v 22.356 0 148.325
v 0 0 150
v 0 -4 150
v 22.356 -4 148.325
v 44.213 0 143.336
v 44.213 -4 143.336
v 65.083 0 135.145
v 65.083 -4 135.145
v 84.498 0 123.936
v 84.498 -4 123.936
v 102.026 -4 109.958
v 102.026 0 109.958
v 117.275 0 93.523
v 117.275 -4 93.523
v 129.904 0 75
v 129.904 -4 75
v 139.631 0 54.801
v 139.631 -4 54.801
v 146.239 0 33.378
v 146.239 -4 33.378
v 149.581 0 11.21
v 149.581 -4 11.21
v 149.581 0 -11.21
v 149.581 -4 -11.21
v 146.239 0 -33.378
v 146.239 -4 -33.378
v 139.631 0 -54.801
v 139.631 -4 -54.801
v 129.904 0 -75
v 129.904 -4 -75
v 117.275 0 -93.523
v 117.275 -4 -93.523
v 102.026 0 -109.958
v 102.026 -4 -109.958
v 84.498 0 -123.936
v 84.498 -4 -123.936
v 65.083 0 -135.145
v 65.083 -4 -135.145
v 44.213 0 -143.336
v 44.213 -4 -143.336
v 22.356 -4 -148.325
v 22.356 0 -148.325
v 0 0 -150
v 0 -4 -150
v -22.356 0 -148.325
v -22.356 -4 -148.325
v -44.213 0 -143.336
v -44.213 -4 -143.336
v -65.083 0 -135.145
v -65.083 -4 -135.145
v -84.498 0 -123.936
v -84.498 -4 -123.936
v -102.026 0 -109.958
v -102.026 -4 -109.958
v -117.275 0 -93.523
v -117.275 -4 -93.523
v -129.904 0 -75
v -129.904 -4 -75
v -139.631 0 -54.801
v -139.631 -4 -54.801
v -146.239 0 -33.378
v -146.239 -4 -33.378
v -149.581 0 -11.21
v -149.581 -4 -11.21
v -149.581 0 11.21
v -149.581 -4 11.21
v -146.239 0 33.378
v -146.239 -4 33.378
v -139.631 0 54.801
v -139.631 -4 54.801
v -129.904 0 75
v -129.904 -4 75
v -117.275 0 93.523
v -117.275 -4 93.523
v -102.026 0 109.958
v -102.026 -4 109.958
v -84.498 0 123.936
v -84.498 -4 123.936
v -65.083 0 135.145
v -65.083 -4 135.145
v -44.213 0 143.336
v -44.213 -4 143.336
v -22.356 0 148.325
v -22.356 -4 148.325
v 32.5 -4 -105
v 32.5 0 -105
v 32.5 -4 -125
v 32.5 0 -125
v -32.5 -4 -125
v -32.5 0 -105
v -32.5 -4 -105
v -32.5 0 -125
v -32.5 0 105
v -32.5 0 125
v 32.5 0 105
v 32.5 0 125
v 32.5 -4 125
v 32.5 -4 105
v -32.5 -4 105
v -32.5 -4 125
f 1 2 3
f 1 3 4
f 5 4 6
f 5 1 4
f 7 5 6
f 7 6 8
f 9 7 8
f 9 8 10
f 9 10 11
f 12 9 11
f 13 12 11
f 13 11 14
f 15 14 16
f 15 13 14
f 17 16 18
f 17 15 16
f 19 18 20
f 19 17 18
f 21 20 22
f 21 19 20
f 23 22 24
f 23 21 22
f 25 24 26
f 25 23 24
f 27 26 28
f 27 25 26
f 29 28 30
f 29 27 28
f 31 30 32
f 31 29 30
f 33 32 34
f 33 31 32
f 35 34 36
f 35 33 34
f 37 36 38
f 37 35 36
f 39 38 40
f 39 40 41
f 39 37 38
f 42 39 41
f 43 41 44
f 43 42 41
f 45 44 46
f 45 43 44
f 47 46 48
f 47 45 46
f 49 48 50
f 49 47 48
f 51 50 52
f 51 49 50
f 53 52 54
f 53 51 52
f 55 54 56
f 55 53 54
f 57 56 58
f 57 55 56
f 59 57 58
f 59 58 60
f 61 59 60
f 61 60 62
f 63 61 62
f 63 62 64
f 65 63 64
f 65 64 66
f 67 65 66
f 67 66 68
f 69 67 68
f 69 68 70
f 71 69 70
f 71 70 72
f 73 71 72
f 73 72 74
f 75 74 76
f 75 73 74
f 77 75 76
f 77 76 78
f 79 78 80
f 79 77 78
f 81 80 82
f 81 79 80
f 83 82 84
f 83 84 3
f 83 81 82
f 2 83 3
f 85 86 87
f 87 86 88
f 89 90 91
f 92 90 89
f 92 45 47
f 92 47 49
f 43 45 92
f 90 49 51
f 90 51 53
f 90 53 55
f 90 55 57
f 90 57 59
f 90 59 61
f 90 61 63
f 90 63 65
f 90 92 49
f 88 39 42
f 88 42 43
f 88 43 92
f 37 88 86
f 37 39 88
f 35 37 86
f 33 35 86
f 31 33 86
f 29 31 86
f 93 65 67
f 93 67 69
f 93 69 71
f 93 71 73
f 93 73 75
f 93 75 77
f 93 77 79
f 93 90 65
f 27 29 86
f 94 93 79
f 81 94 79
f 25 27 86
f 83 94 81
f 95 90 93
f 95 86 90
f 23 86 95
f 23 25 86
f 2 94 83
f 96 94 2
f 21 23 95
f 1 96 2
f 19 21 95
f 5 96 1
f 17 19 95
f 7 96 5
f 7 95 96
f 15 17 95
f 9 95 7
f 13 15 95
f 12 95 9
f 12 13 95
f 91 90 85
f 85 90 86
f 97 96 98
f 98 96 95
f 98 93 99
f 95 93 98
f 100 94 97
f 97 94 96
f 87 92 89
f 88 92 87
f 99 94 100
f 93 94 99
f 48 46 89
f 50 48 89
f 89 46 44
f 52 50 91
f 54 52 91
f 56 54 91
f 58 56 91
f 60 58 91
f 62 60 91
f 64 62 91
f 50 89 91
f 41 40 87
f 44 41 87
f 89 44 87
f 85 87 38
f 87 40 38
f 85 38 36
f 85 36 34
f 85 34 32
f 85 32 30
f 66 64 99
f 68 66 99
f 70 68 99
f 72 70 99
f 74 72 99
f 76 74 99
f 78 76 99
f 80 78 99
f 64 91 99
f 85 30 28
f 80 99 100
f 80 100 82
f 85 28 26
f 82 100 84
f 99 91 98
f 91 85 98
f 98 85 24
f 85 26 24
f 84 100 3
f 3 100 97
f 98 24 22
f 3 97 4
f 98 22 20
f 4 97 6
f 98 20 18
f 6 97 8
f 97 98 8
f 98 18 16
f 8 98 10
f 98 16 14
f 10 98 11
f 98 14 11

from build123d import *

# Parameters (mm, degrees)
ESQUISSE2_R             = 150
BOSS_EXTRU_1_DEPTH      = 4
ESQUISSE4_W             = 65
ESQUISSE4_H             = 20
ENL_V_MAT_EXTRU_1_DEPTH = 213.169743366


with BuildPart() as part:
    # Esquisse2 → Boss.-Extru.1 (new body)
    with BuildSketch(Plane(origin=(0, 0, 0), x_dir=(1, 0, 0), z_dir=(0, 1, 0))):
        with Locations(Location((0, 0, 0), (0, 0, 270))):
            Circle(ESQUISSE2_R)
    extrude(amount=-BOSS_EXTRU_1_DEPTH)

    # Esquisse4 → Enlèv. mat.-Extru.1 (cut, through all)
    with BuildSketch(Plane(origin=(0, 0, 0), x_dir=(1, 0, 0), z_dir=(0, 1, 0))):
        with Locations((0, -115)):
            Rectangle(ESQUISSE4_W, ESQUISSE4_H)
        with Locations((0, 115)):
            Rectangle(ESQUISSE4_W, ESQUISSE4_H)
    extrude(amount=-ENL_V_MAT_EXTRU_1_DEPTH, mode=Mode.SUBTRACT)


solid = part.part
